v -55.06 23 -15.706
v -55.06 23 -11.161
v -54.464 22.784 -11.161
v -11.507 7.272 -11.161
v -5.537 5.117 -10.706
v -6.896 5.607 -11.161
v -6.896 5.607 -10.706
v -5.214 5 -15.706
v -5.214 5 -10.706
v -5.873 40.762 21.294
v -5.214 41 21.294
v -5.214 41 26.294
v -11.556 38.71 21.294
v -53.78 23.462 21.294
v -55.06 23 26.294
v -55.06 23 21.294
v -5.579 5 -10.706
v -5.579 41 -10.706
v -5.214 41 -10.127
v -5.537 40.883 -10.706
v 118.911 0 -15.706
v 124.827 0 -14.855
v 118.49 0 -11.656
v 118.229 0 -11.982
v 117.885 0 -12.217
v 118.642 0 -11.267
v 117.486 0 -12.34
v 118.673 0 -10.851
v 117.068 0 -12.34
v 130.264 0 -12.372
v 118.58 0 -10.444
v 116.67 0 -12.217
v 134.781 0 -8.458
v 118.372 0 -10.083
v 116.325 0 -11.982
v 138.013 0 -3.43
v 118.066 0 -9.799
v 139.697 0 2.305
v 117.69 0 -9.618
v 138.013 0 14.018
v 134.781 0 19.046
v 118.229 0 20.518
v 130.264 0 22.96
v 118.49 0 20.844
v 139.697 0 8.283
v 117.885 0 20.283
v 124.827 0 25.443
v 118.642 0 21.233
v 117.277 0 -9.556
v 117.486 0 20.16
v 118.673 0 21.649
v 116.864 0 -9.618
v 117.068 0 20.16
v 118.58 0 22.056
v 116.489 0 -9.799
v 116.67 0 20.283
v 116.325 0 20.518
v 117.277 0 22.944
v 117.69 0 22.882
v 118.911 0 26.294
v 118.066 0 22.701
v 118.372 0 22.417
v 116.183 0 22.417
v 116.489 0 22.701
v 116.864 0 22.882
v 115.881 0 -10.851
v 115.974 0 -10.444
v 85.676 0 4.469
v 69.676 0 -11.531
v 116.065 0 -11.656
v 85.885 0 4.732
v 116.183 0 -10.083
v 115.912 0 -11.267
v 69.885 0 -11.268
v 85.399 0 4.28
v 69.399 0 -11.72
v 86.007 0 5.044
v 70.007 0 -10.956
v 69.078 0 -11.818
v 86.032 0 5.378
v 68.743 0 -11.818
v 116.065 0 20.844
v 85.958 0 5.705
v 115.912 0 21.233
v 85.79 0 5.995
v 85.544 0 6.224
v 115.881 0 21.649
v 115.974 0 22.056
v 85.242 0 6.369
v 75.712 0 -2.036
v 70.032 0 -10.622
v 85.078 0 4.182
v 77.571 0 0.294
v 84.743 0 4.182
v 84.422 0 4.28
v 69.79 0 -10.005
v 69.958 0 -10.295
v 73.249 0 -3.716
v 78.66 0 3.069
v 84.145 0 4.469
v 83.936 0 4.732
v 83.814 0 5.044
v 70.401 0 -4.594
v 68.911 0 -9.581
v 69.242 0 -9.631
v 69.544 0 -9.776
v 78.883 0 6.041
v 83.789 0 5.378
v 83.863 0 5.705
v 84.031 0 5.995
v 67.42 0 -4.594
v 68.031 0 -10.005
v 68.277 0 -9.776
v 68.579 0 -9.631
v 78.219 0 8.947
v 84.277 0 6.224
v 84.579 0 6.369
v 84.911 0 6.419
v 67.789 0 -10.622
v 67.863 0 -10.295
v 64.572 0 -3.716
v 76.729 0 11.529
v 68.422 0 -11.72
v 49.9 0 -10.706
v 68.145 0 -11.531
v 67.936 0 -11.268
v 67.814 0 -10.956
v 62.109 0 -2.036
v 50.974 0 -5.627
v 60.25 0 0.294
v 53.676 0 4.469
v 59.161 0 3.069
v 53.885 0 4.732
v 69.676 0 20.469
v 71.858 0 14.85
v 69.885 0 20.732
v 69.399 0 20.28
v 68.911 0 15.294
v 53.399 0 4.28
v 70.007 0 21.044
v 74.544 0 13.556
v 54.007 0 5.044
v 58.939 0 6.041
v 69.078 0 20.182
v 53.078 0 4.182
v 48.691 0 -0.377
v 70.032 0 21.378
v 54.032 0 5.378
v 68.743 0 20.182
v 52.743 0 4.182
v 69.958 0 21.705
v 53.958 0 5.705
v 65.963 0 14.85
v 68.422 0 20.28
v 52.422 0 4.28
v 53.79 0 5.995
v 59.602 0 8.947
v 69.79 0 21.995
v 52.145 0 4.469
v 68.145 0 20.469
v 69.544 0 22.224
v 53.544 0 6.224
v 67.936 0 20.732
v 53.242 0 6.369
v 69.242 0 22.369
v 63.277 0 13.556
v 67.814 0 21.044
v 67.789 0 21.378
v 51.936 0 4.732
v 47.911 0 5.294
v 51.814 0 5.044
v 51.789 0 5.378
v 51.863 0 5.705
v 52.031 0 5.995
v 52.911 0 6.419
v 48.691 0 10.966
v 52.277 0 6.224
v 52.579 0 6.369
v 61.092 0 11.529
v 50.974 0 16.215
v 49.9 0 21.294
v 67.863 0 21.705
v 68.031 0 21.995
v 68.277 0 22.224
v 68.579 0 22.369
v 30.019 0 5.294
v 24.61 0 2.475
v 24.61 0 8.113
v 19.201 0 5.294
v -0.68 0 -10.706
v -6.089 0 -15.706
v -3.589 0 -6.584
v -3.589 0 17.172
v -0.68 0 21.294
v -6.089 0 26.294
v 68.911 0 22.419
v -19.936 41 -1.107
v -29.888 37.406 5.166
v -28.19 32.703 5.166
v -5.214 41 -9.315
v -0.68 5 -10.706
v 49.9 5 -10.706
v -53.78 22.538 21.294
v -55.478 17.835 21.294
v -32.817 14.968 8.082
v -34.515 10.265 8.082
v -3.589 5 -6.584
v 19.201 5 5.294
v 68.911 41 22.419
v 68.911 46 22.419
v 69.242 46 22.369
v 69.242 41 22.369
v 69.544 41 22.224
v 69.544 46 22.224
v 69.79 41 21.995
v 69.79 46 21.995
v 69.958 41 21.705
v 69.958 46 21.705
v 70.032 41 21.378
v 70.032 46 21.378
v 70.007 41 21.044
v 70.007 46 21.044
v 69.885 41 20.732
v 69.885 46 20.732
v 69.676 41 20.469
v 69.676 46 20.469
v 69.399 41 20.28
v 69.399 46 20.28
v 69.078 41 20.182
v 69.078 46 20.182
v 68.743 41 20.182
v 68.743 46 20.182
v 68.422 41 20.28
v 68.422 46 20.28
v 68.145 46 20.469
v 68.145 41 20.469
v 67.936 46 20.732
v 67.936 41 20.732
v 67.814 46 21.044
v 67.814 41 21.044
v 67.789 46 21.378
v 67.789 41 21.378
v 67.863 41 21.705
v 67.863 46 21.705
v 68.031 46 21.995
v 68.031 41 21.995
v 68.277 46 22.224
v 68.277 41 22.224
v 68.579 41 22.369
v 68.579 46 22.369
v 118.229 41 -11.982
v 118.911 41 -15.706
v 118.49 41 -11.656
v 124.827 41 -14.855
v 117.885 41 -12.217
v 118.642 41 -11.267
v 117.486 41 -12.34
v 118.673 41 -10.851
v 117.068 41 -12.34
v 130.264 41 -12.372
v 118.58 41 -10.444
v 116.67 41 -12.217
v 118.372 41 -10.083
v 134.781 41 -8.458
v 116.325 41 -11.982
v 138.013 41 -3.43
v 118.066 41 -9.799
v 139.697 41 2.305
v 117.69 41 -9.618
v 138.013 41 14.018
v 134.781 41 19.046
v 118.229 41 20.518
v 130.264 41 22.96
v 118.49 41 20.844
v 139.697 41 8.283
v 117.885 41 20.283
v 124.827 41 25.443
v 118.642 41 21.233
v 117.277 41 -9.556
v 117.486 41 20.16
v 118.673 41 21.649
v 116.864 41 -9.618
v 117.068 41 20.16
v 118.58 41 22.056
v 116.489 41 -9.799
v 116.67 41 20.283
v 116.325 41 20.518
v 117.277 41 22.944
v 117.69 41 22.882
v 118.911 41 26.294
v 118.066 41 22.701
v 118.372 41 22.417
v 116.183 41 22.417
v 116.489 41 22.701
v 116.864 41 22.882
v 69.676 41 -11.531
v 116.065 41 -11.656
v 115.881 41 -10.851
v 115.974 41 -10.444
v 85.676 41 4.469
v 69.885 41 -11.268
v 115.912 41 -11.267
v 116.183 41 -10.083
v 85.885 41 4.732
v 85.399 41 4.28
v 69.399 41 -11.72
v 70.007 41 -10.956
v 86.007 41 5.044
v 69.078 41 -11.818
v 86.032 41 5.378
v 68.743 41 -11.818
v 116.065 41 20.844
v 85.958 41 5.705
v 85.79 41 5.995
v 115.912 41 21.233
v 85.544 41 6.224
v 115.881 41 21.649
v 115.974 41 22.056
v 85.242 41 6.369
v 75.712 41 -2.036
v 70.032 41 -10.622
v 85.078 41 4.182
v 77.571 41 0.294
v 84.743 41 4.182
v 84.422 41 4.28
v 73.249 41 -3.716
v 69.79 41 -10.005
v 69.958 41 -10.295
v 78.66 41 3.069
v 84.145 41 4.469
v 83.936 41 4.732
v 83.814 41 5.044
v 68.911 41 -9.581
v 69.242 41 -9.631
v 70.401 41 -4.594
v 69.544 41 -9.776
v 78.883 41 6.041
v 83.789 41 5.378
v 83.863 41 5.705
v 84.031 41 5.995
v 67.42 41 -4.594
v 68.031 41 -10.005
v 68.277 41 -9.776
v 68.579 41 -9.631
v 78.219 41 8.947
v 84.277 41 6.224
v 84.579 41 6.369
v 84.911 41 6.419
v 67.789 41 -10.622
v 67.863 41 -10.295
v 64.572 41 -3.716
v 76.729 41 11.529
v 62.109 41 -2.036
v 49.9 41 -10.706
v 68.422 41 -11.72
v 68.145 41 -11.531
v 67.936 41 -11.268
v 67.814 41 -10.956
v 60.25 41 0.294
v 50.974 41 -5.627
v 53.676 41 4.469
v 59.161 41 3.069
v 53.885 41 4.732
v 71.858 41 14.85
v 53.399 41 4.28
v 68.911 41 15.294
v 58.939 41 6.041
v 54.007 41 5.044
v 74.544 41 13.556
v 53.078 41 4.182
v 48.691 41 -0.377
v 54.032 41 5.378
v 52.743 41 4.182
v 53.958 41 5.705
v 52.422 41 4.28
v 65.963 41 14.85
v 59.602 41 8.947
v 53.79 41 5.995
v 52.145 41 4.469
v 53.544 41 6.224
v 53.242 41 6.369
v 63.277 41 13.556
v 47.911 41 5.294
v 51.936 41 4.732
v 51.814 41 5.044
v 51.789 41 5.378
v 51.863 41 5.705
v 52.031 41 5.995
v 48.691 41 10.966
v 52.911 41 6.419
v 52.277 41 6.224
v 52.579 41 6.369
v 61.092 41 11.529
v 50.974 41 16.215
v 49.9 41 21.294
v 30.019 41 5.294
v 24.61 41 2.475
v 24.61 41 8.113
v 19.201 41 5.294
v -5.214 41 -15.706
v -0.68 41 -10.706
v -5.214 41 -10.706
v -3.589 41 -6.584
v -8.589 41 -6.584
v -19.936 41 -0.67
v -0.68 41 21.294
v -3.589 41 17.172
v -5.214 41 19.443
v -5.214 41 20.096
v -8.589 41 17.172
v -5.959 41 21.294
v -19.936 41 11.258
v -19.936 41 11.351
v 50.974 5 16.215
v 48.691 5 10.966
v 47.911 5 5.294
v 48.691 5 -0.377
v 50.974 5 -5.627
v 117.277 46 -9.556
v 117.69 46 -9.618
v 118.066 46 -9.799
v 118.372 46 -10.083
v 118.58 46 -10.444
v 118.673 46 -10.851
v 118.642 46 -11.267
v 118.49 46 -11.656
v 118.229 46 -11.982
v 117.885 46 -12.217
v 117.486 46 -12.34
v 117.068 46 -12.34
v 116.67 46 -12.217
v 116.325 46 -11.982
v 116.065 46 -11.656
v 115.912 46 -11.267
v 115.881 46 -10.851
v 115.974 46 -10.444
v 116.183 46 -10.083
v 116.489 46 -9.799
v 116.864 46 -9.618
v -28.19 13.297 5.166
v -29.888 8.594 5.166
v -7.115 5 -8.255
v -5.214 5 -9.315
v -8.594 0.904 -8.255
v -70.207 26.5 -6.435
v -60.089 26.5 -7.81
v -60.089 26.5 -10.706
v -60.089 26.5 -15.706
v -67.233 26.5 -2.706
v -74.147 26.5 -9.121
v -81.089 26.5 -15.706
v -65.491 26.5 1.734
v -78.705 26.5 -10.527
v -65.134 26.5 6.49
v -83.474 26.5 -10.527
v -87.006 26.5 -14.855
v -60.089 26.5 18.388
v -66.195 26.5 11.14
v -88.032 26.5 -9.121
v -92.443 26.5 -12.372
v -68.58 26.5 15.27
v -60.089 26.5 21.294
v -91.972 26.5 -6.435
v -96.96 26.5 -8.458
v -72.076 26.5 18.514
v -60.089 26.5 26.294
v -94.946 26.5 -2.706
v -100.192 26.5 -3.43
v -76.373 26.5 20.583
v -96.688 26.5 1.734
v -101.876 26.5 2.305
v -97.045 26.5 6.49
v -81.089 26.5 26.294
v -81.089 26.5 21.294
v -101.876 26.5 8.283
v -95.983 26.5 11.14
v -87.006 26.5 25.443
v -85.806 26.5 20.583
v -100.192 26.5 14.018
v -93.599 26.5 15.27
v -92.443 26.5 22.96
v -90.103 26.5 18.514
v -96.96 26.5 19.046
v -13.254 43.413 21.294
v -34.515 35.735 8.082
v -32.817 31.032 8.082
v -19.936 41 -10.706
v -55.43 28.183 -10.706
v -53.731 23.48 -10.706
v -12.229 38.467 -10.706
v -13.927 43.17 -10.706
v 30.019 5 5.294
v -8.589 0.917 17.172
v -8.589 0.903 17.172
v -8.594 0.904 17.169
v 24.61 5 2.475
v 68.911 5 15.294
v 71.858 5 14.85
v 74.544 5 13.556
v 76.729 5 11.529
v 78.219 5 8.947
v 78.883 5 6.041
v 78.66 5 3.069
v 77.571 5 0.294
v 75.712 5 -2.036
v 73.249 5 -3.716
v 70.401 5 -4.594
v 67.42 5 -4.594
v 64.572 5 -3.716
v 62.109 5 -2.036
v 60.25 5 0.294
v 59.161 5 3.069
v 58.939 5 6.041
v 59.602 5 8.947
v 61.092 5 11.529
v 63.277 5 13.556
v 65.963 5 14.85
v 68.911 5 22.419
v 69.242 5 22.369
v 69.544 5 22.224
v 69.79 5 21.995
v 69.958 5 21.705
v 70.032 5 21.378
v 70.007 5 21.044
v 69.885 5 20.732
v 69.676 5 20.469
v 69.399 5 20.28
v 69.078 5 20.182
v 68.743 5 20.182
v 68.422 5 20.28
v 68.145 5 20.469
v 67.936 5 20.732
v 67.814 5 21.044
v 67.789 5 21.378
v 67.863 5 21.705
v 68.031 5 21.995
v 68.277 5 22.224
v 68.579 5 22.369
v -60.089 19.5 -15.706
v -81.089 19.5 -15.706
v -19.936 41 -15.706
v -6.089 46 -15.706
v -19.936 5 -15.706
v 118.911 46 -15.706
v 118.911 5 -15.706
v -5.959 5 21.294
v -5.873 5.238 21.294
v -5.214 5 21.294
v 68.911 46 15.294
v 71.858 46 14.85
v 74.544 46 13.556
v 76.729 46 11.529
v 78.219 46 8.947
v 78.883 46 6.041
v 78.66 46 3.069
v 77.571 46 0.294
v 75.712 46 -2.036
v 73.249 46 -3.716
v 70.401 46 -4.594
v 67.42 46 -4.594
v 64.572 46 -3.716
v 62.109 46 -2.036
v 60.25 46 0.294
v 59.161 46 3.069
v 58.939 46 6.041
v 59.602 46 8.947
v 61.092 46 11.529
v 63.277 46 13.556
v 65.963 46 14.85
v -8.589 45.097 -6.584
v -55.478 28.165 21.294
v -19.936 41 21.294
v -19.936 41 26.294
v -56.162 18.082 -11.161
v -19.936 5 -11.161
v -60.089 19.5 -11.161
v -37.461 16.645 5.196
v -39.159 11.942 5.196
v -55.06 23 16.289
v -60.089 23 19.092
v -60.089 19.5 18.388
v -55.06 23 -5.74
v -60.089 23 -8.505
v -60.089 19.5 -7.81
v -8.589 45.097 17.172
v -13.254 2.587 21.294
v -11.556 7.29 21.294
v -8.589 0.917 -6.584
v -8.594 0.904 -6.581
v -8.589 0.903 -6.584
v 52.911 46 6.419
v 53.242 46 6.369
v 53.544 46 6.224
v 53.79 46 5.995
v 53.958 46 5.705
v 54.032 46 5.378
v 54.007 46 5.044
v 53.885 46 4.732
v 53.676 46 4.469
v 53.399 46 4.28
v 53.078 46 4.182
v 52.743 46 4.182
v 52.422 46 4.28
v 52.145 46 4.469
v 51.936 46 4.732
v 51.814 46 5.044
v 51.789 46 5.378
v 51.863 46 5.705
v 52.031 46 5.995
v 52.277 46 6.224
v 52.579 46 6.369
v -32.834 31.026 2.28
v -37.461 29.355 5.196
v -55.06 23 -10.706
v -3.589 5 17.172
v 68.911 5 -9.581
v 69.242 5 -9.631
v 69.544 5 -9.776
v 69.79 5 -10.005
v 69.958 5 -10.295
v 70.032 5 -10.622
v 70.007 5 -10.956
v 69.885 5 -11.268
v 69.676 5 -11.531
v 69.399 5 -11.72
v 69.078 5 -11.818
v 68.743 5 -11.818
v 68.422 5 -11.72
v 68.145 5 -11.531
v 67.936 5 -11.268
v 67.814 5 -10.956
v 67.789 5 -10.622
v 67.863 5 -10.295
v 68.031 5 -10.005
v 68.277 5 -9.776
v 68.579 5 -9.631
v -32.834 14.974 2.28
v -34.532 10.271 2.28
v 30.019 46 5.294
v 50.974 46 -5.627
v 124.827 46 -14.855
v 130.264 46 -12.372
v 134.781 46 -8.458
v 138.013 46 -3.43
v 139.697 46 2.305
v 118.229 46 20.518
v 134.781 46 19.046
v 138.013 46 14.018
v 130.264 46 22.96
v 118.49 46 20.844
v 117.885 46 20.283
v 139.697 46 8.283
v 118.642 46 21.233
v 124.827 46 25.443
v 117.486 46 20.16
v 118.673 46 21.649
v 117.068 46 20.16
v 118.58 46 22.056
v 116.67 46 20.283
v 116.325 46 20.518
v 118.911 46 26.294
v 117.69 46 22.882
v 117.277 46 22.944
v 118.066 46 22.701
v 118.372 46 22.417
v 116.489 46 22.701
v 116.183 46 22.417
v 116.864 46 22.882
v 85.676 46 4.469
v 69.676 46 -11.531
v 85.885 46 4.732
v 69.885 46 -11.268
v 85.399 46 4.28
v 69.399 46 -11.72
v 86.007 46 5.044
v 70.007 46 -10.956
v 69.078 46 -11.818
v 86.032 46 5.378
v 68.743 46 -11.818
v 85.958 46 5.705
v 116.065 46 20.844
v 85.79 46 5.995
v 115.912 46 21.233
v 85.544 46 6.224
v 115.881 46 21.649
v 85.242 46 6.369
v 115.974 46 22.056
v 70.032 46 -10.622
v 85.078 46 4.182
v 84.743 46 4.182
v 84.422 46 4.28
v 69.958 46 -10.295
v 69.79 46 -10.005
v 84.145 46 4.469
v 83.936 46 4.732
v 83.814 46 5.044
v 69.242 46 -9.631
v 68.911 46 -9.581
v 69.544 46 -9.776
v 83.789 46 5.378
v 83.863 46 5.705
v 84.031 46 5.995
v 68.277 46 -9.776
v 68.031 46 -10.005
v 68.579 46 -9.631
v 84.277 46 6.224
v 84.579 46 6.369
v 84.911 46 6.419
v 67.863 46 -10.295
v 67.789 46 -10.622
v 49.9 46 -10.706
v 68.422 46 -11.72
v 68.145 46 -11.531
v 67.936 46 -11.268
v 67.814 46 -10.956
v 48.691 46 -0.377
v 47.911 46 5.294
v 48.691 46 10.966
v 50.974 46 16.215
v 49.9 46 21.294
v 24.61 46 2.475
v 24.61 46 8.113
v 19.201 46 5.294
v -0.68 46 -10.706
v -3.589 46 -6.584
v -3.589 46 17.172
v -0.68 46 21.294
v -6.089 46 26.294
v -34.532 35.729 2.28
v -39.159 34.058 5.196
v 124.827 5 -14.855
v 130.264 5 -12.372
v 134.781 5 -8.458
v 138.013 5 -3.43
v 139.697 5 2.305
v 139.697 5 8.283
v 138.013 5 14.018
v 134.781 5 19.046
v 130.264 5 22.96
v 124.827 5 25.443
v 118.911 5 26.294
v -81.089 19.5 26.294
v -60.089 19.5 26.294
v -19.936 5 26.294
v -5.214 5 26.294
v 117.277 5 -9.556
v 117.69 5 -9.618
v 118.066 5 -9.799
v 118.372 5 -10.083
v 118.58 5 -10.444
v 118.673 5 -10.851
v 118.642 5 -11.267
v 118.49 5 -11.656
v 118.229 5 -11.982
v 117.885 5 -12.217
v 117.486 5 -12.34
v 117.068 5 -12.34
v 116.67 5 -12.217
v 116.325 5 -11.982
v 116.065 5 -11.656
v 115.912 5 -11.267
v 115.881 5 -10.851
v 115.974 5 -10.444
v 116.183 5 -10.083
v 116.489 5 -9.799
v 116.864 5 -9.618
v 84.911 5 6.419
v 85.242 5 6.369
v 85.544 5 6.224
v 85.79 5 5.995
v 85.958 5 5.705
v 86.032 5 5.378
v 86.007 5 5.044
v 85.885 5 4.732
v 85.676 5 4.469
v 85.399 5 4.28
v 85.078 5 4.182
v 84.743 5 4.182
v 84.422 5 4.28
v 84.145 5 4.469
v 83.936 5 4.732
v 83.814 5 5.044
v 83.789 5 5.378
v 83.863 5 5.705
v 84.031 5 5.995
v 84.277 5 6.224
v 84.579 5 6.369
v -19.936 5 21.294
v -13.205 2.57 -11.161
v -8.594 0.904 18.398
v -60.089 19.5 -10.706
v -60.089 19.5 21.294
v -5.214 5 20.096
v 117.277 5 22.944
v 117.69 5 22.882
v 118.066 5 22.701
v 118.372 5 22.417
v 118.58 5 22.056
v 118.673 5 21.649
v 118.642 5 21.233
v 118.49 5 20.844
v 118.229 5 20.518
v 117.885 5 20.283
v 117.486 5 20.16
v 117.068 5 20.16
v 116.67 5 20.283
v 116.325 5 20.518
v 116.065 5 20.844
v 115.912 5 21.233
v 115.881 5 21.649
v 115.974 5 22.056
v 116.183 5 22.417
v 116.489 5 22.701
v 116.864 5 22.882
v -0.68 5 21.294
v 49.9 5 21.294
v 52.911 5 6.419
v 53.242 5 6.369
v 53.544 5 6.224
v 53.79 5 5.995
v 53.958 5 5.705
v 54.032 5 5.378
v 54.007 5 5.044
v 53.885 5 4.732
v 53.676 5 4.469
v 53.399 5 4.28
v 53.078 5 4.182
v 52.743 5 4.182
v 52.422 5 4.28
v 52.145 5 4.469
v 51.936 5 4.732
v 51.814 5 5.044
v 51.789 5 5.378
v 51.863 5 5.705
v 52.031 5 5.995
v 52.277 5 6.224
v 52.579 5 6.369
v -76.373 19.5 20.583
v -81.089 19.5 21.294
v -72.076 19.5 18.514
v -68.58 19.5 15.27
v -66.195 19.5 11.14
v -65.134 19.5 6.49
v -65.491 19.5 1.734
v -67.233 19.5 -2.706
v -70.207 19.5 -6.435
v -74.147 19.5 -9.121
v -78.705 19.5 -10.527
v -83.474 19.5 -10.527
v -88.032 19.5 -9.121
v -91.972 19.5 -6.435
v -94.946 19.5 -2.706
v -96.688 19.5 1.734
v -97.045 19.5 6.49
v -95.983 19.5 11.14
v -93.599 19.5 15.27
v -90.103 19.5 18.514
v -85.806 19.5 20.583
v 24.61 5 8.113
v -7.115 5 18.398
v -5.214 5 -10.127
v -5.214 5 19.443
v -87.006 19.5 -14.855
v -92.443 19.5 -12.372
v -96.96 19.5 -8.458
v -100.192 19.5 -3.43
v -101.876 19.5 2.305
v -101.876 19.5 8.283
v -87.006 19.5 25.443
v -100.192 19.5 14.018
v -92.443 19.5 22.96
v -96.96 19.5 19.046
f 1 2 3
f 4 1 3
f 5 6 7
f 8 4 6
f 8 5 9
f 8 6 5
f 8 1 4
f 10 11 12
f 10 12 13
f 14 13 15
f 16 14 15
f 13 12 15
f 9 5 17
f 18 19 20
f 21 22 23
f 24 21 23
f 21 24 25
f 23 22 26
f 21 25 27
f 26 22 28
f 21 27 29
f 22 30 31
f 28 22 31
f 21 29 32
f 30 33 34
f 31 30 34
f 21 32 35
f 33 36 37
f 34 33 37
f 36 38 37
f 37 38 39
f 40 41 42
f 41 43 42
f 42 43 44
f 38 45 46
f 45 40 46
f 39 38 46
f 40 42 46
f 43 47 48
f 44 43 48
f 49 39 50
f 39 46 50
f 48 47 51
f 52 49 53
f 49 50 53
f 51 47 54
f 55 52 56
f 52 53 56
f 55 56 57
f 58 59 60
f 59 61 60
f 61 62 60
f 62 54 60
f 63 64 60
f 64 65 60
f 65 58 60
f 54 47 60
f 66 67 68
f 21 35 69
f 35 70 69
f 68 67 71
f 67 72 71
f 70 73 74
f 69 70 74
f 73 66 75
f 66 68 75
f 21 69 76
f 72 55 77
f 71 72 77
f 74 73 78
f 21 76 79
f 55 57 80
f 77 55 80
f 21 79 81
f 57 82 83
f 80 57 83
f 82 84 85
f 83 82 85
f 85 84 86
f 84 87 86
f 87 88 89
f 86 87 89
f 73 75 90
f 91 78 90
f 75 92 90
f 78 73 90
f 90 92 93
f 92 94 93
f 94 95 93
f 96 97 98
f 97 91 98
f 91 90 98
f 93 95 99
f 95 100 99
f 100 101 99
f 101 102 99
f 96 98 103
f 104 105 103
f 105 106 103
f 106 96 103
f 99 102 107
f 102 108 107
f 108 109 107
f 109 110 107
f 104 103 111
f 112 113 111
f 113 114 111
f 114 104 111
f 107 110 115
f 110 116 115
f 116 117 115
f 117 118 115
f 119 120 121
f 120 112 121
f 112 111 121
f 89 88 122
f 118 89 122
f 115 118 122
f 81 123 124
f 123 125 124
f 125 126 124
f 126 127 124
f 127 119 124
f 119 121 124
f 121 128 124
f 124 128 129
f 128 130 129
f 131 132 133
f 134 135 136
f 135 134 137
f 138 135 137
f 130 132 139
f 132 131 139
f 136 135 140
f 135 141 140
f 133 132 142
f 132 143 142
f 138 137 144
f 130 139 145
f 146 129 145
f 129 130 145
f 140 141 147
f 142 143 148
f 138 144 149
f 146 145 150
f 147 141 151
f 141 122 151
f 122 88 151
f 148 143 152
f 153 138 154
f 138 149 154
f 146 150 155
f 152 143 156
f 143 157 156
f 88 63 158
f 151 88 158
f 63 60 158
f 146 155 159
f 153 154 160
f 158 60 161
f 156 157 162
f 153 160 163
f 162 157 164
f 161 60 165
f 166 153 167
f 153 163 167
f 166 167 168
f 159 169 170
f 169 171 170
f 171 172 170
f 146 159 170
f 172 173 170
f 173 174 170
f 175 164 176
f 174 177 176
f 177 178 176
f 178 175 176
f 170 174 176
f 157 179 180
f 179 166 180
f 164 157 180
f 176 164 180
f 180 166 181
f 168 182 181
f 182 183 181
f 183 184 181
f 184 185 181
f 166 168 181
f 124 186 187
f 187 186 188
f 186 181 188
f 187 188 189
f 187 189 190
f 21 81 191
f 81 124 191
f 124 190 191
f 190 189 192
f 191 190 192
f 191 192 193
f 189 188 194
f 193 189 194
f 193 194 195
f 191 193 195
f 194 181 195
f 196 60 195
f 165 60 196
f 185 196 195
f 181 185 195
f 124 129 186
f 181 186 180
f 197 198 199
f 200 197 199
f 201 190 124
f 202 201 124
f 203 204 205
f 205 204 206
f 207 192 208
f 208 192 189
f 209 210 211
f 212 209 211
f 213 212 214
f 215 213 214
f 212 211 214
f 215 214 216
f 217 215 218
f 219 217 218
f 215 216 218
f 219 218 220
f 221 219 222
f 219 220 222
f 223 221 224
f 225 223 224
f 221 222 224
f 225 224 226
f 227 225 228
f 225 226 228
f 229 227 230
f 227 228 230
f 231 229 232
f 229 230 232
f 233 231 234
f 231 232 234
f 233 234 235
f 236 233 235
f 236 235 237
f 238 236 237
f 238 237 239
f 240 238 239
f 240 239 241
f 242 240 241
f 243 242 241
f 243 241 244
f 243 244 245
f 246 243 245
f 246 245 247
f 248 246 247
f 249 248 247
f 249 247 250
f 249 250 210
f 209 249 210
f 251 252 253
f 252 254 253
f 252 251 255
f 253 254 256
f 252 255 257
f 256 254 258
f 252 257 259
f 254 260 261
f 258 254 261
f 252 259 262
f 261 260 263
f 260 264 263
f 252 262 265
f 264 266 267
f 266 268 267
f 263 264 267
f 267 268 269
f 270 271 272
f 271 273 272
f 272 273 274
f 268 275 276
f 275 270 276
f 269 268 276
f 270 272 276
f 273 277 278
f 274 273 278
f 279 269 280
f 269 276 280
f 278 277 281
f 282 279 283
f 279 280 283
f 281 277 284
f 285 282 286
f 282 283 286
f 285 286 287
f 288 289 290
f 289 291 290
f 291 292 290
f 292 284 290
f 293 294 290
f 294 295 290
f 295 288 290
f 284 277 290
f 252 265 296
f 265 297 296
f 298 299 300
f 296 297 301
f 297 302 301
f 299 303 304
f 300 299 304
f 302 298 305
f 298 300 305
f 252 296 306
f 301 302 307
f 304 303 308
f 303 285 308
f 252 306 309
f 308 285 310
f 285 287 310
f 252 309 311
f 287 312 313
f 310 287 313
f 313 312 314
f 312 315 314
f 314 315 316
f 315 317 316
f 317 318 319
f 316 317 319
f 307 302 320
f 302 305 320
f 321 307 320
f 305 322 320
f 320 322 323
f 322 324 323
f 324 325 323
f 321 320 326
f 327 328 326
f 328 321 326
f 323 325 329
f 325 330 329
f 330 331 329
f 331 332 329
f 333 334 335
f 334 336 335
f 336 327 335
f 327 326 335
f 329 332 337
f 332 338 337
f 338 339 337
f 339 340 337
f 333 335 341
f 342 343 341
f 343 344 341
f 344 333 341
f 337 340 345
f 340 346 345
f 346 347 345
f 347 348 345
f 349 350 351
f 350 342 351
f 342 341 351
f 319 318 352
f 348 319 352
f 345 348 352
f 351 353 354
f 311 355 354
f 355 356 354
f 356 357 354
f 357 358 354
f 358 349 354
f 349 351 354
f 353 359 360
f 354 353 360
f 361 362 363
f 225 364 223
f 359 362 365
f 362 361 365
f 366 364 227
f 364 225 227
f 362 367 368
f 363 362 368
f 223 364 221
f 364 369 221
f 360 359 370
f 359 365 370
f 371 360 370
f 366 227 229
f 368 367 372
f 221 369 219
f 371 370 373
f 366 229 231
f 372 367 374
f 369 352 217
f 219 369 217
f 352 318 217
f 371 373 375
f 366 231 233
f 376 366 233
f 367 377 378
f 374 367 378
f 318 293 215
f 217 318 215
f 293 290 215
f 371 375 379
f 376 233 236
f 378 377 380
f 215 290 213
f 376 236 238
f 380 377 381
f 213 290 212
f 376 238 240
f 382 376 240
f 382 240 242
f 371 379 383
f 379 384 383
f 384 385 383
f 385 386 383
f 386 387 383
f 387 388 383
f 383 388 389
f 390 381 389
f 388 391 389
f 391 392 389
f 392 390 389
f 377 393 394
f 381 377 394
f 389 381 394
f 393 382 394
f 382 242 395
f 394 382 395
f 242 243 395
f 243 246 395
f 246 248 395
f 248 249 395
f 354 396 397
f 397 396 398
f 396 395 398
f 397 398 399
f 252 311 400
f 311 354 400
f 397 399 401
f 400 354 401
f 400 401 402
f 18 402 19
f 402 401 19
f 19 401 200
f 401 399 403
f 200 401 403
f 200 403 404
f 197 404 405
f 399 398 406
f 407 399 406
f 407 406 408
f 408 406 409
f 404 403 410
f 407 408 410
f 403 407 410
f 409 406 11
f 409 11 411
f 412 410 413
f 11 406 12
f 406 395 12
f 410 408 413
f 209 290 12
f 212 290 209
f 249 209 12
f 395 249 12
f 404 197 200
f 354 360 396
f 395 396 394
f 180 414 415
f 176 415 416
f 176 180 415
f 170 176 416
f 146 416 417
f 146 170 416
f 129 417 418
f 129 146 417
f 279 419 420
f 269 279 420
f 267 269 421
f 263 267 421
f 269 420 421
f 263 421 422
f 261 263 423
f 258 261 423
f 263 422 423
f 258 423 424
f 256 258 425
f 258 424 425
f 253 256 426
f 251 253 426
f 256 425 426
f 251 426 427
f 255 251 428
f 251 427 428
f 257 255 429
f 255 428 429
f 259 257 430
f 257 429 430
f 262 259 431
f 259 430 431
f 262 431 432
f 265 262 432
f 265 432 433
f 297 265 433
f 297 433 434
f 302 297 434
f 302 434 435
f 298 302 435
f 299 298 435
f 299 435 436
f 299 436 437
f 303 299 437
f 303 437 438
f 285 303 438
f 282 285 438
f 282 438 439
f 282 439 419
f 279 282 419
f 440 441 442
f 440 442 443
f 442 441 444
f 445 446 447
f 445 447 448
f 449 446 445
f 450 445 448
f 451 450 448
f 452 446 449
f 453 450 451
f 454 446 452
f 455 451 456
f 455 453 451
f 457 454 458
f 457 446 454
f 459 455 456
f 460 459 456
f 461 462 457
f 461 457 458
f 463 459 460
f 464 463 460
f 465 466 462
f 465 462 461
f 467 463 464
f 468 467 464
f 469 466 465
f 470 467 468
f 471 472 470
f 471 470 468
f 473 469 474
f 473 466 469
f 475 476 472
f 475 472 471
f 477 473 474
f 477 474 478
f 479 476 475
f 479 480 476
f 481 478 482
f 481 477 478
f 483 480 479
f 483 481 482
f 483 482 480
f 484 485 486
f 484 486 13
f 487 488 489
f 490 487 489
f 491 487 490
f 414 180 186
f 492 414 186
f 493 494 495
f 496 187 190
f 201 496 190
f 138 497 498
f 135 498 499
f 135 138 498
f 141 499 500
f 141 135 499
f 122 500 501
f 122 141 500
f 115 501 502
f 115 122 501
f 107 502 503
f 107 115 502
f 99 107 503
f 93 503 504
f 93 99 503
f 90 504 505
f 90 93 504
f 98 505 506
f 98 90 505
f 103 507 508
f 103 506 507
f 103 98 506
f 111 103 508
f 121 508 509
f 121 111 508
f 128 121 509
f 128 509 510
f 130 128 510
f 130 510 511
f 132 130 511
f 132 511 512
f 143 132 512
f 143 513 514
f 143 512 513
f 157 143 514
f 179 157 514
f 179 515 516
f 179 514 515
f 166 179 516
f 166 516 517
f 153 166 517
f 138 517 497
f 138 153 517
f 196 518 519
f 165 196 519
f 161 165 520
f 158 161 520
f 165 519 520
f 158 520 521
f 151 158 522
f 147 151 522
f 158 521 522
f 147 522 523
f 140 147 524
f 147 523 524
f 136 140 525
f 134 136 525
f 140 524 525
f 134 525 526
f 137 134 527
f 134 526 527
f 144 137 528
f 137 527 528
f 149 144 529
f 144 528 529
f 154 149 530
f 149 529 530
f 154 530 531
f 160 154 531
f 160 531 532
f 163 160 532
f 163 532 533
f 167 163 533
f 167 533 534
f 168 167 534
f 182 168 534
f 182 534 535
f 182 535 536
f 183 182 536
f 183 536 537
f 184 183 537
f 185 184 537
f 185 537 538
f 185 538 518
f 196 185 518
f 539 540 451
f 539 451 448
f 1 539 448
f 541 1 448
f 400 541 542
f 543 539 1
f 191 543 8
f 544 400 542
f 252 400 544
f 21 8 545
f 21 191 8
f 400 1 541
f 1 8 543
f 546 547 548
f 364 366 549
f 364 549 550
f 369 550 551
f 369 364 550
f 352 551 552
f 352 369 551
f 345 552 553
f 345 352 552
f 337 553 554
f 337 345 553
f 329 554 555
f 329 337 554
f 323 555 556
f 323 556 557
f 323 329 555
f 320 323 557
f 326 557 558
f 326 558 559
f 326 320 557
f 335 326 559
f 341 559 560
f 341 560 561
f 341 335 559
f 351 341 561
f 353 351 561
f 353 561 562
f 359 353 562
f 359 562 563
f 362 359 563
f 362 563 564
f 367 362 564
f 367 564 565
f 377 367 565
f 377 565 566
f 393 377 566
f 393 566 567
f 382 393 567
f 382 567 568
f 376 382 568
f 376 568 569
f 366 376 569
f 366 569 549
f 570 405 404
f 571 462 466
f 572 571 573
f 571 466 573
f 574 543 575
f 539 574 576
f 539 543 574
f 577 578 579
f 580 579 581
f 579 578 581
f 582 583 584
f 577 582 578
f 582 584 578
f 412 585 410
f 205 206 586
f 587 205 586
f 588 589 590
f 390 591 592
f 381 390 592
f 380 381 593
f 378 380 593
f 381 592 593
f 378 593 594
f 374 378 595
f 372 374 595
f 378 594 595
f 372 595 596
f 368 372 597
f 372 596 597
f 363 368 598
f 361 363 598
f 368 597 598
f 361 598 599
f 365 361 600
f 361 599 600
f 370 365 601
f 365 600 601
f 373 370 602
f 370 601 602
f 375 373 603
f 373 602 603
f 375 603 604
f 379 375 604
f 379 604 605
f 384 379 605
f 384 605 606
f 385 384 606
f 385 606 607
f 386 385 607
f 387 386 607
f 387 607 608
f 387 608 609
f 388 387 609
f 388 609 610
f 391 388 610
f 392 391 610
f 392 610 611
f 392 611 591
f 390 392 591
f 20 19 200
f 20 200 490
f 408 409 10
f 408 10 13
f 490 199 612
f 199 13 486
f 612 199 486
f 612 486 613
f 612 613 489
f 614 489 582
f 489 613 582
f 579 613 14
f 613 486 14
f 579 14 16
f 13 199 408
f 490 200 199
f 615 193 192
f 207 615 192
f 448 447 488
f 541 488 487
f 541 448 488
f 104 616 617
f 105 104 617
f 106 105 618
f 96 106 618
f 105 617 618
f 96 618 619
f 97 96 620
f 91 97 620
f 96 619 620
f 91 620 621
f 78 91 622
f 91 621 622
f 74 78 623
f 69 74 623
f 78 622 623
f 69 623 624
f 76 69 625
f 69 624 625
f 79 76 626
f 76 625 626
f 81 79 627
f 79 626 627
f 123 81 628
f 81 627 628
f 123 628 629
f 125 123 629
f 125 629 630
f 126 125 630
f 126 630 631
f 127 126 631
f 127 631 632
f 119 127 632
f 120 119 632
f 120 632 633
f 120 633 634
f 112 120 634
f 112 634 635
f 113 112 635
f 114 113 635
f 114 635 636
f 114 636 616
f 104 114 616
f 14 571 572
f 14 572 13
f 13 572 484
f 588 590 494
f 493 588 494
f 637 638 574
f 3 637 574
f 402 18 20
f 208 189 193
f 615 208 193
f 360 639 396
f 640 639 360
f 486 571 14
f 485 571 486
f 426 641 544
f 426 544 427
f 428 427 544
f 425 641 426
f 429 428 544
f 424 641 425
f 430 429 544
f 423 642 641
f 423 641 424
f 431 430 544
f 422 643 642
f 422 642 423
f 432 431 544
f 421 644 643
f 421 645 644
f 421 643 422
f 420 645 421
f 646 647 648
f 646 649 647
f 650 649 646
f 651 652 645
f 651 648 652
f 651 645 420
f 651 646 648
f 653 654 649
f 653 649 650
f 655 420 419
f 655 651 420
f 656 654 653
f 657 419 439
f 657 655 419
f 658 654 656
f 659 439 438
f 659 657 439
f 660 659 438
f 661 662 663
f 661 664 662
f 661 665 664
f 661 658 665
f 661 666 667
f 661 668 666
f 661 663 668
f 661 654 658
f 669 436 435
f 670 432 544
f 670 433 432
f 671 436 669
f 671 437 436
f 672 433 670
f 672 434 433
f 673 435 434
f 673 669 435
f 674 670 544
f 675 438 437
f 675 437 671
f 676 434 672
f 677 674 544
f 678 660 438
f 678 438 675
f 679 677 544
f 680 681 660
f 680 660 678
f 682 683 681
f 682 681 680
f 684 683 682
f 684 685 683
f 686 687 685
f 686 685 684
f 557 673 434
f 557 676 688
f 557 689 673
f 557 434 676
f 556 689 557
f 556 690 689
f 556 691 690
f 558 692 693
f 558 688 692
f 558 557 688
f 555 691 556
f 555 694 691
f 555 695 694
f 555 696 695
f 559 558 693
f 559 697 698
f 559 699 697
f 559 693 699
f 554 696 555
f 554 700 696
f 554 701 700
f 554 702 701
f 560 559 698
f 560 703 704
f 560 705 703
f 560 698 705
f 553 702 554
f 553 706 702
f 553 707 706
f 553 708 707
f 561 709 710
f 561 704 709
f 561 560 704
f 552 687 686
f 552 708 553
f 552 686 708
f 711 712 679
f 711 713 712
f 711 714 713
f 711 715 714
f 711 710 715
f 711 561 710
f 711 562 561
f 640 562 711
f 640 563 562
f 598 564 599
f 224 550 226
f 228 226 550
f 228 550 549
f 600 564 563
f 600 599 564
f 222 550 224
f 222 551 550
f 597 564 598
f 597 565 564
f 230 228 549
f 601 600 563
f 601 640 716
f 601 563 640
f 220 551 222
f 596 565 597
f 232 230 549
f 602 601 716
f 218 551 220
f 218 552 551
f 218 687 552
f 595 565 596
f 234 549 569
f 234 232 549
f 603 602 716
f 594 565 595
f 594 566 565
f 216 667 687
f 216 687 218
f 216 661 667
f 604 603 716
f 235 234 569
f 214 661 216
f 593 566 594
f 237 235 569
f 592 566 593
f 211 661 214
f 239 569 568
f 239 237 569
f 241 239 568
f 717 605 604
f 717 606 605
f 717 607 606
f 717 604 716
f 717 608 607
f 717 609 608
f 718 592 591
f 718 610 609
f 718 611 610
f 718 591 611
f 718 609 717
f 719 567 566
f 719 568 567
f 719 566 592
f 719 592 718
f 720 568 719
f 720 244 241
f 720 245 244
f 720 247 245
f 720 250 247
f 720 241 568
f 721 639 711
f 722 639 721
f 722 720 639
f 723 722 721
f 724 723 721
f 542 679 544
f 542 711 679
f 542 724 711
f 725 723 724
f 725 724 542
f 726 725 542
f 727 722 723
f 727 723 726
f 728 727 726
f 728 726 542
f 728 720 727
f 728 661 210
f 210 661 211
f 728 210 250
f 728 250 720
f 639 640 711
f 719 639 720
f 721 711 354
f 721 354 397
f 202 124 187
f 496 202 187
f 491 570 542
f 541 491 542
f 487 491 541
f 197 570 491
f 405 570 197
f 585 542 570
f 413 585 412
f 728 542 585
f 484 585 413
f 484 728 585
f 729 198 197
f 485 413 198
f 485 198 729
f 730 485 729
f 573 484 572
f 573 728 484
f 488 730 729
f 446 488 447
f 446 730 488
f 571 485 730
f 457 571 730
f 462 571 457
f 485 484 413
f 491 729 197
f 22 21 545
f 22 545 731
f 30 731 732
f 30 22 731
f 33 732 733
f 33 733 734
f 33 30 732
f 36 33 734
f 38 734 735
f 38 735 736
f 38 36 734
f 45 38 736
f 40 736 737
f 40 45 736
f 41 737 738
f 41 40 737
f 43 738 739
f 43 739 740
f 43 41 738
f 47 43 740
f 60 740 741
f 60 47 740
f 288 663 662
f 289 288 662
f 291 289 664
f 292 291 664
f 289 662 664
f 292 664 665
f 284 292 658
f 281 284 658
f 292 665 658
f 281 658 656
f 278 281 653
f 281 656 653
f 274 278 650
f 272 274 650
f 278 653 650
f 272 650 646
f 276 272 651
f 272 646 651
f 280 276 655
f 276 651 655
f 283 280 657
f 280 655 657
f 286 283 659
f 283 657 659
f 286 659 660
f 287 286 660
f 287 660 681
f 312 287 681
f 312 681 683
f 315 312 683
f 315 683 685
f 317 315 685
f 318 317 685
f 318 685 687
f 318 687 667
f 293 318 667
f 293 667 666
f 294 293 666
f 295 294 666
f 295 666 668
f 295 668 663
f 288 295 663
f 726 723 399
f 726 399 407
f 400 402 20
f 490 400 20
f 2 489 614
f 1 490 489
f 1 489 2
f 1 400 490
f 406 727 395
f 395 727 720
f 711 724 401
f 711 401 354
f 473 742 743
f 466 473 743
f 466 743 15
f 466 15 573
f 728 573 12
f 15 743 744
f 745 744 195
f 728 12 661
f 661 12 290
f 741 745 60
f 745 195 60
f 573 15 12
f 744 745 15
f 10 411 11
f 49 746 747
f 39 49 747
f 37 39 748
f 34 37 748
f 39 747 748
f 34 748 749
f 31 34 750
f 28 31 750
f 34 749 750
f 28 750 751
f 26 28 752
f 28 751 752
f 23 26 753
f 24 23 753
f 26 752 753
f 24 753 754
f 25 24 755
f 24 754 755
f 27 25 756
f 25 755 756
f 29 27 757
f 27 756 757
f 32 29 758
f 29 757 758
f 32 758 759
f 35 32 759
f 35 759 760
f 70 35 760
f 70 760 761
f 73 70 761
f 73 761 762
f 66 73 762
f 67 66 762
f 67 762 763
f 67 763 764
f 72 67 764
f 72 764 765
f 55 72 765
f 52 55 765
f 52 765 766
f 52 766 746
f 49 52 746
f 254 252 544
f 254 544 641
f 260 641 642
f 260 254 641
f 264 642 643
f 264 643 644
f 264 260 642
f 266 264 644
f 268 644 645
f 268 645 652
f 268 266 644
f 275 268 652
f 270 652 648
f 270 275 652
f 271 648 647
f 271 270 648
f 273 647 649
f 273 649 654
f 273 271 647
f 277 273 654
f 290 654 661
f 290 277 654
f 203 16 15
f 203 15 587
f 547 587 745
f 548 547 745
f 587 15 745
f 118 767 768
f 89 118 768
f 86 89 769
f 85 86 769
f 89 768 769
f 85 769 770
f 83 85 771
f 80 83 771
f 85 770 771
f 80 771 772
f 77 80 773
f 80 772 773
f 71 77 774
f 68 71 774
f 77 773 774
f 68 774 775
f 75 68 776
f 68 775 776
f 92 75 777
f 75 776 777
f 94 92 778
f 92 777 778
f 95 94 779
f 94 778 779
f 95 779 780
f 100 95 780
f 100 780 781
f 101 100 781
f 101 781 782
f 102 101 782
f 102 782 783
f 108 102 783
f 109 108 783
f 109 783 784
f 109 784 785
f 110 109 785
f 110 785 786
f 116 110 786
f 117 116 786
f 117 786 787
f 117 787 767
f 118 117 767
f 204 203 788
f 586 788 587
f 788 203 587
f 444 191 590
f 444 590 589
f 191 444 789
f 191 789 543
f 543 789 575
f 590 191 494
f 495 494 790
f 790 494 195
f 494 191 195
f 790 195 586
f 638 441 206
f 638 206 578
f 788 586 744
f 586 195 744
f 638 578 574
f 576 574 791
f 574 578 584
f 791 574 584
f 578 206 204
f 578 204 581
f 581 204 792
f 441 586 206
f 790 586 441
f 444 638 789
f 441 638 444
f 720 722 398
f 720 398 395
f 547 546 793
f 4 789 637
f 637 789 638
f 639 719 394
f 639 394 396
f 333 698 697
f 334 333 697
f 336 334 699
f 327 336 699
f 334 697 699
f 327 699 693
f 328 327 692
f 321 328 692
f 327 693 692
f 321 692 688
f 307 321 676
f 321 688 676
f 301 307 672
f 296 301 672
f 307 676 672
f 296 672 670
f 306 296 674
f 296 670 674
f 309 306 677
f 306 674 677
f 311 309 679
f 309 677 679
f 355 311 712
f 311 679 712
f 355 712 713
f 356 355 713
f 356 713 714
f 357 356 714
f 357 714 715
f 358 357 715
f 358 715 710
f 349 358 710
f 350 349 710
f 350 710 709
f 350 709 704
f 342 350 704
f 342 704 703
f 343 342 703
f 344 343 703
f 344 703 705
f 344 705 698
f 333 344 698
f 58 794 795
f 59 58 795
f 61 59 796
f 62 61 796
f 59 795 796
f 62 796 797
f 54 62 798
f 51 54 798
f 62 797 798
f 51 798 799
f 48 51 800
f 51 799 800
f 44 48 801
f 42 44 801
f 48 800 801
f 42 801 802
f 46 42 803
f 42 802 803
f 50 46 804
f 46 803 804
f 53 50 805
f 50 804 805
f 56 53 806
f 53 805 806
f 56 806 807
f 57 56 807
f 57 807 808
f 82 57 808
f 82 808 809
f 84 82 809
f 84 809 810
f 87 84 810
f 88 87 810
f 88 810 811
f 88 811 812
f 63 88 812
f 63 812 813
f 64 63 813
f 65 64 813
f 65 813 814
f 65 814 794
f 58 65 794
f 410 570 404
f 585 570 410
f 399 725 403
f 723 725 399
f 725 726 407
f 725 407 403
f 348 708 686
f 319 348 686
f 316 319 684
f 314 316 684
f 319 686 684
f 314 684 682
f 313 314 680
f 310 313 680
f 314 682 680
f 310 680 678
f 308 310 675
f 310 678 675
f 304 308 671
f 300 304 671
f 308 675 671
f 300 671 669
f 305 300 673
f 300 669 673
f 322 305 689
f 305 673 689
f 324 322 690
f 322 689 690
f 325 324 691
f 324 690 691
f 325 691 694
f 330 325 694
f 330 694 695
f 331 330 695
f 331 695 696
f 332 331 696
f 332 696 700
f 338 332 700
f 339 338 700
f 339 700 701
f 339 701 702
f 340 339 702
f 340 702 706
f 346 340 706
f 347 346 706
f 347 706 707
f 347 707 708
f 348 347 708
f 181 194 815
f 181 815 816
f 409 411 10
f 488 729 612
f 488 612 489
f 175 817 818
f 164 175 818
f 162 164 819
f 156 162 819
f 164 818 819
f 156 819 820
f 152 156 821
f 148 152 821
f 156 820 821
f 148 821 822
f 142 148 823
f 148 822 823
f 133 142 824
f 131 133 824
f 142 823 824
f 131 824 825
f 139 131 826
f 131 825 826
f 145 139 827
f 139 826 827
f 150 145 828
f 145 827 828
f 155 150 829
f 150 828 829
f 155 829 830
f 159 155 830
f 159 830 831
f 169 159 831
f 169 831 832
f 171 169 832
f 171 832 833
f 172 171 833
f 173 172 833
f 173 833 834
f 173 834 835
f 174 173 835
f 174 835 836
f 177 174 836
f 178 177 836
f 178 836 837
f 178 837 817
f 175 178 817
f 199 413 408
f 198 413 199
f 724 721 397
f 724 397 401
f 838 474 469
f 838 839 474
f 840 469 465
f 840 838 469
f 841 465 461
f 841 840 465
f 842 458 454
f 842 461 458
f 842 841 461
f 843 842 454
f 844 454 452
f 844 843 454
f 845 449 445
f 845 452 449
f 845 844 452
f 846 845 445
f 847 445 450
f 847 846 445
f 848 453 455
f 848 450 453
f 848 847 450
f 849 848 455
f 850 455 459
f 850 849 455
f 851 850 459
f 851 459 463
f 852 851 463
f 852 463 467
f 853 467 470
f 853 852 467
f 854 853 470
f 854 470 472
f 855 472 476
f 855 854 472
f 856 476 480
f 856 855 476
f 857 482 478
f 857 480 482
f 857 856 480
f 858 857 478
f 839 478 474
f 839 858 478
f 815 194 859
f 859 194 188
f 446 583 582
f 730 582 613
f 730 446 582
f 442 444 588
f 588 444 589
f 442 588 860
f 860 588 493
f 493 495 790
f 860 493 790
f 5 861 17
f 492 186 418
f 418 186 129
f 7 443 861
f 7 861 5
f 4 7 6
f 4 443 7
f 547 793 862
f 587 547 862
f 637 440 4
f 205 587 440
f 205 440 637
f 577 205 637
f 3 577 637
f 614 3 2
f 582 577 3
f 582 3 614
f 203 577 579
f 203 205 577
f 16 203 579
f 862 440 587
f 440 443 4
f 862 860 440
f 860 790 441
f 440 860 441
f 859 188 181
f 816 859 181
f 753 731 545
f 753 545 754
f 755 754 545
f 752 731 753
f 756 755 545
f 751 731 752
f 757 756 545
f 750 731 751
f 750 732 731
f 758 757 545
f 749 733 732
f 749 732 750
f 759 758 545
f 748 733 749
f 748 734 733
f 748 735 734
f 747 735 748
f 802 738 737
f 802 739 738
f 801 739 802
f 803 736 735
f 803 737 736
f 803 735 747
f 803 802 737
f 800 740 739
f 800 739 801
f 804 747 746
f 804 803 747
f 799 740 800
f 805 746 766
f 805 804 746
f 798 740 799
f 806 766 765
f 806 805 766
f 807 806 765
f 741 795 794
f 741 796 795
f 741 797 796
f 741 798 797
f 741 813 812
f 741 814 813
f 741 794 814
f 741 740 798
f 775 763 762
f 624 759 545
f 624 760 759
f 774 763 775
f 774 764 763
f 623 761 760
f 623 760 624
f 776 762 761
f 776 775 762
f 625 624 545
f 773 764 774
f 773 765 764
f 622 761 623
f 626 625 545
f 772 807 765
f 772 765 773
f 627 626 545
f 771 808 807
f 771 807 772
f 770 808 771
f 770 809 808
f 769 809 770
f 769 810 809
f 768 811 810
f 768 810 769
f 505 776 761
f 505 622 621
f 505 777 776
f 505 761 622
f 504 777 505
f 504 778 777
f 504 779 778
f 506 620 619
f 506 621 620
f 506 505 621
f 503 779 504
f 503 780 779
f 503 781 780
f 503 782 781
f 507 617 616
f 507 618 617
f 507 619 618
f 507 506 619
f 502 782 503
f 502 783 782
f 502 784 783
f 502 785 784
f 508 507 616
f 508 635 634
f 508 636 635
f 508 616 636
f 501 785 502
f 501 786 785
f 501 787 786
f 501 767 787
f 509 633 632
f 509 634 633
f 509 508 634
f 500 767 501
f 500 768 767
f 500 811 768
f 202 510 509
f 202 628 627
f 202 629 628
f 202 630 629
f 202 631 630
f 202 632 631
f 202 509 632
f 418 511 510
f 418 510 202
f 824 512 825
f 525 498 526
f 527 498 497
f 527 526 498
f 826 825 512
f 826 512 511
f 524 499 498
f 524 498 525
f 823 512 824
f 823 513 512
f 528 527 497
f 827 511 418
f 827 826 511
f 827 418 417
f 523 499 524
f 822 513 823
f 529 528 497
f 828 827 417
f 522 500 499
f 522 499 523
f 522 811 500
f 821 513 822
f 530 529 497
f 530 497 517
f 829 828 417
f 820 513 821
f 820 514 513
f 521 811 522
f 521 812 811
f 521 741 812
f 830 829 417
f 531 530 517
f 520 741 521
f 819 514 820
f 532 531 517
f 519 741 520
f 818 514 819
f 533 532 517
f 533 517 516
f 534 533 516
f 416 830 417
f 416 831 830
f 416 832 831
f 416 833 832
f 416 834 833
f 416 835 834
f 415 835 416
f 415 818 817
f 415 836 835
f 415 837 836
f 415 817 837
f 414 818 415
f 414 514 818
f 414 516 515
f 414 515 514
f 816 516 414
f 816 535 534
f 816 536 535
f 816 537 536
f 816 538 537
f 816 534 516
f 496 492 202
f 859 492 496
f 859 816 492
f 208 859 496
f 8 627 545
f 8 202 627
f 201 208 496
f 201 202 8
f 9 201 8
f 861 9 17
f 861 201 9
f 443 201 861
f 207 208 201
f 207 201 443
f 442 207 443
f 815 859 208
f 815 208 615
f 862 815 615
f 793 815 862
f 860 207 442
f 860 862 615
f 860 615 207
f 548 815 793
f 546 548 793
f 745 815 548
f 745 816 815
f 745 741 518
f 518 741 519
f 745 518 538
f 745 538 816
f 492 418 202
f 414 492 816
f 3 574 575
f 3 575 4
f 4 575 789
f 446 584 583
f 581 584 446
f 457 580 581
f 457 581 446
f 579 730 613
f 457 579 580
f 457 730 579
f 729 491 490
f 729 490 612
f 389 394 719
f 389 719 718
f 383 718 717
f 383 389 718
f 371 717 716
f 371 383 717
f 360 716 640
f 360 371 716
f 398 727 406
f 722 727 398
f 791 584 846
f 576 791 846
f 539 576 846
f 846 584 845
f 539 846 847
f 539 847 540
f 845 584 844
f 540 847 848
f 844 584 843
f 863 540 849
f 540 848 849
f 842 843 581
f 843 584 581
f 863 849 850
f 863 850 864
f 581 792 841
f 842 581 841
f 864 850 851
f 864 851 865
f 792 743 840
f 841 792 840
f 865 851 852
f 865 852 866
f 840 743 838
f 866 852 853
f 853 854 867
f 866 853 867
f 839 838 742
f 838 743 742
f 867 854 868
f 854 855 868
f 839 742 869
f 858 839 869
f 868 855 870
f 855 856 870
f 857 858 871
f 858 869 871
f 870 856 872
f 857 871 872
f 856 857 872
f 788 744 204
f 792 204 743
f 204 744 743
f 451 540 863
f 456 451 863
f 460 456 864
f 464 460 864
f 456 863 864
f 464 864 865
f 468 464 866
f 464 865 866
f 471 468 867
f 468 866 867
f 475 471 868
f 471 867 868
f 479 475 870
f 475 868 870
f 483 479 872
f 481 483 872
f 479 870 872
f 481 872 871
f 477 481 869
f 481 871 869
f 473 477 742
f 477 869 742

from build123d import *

# Parameters (mm, degrees)
SKETCH_1_R               = 21
SKETCH_1_R_2             = 16
EXTRUDE_1_DEPTH          = 46
SKETCH_1_R_3             = 10
EXTRUDE_1_2_DEPTH        = 46
SKETCH_2_W               = 150
SKETCH_2_H               = 5
EXTRUDE_3_DEPTH          = 5
SKETCH_3_W               = 150
SKETCH_3_H               = 5
EXTRUDE_4_DEPTH          = 5
EXTRUDE_5_DEPTH          = 5
SKETCH_6_W               = 169.409921662
SKETCH_6_H               = 36
CUT_EXTRUDE_1_DEPTH      = 42
CUT_EXTRUDE_4_REACH      = 155.15
EXTRUDE_7_DEPTH          = 5
EXTRUDE_8_REACH          = 155.15
EXTRUDE_8_END_RADIUS     = 21
SKETCH_10_W              = 21
SKETCH_10_H              = 7
SKETCH_11_W              = 54.75
SKETCH_11_H              = 32.4550301
CUT_EXTRUDE_5_DEPTH      = 5
EXTRUDE_15_DEPTH         = 5
SKETCH_13_R              = 1.125
CUT_EXTRUDE_6_DEPTH      = 150.607304507
CUT_EXTRUDE_6_DEPTH_BACK = 150.607304507
SKETCH_14_R              = 1.4
CUT_EXTRUDE_7_DEPTH      = 150.607304507
CUT_EXTRUDE_7_DEPTH_BACK = 150.607304507


with BuildPart() as part:
    # 스케치1 → 보스-돌출1 (new body)
    with BuildSketch(Plane(origin=(0, 0, 0), x_dir=(1, 0, 0), z_dir=(0, 1, 0))):
        with Locations(Location((-81.089427727, -5.294054995, 0), (0, 0, 270))):
            Circle(SKETCH_1_R)
        with Locations(Location((-81.089427727, -5.294054995, 0), (0, 0, 270))):
            Circle(SKETCH_1_R_2, mode=Mode.SUBTRACT)
    extrude(amount=EXTRUDE_1_DEPTH)



with BuildPart() as body_2:
    # 스케치1 → Extrude 1 2 (new body)
    with BuildSketch(Plane(origin=(0, 0, 0), x_dir=(1, 0, 0), z_dir=(0, 1, 0))):
        with BuildLine():
            Line((68.910572273, 15.705945005), (118.910572273, 15.705945005))
            ThreePointArc((118.910572273, 15.705945005), (139.910572273, -5.294054995), (118.910572273, -26.294054995))
            Line((118.910572273, -26.294054995), (68.910572273, -26.294054995))
            ThreePointArc((68.910572273, -26.294054995), (47.910572273, -5.294054995), (68.910572273, 15.705945005))
        make_face()
        with Locations(Location((68.910572273, -5.294054995, 0), (0, 0, 270))):
            Circle(SKETCH_1_R_3, mode=Mode.SUBTRACT)
    extrude(amount=EXTRUDE_1_2_DEPTH)


with BuildPart() as part_1:
    add(part.part)

    add(body_2.part)  # 보스-돌출3 merges body 2
    # 스케치2 → 보스-돌출3 (add)
    with BuildSketch(Plane(origin=(0, 46, 0), x_dir=(1, 0, 0), z_dir=(0, 1, 0))):
        with Locations((-6.089427727, -23.794054995)):
            Rectangle(SKETCH_2_W, SKETCH_2_H)
        with Locations((-6.089427727, 13.205945005)):
            Rectangle(SKETCH_2_W, SKETCH_2_H)
    extrude(amount=-EXTRUDE_3_DEPTH)

    # 스케치3 → 보스-돌출4 (add)
    with BuildSketch(Plane.XZ):
        with Locations((-6.089427727, -13.205945005)):
            Rectangle(SKETCH_3_W, SKETCH_3_H)
        with Locations((-6.089427727, 23.794054995)):
            Rectangle(SKETCH_3_W, SKETCH_3_H)
    extrude(amount=-EXTRUDE_4_DEPTH)

    # 스케치4 → 보스-돌출5 (add)
    with BuildSketch(Plane.XZ):
        Polygon((-36.788692473, 8.113223678), (-7.244877213, 23.511020598), (-6.089427727, 21.294054995), (-4.933978242, 23.511020598), (24.609837018, 8.113223678), (54.153652279, 23.511020598), (56.46455125, 19.077089392), (30.018987378, 5.294054995), (56.46455125, -8.488979402), (54.153652279, -12.922910608), (24.609837018, 2.474886312), (-4.933978242, -12.922910608), (-7.244877213, -12.922910608), (-36.788692473, 2.474886312), (-66.332507733, -12.922910608), (-68.643406704, -8.488979402), (-42.197842833, 5.294054995), (-68.643406704, 19.077089392), (-66.332507733, 23.511020598), align=None)
        Polygon((-31.379542113, 5.294054995), (-8.589427727, -6.583813521), (-8.589427727, 17.17192351), align=None, mode=Mode.SUBTRACT)
        Polygon((-3.589427727, -6.583813521), (19.200686659, 5.294054995), (-3.589427727, 17.17192351), align=None, mode=Mode.SUBTRACT)
    extrude_5 = extrude(amount=-EXTRUDE_5_DEPTH)

    # 스케치6 → 컷-돌출1 (cut)
    with BuildSketch(Plane(origin=(0, 0, -15.705945005), x_dir=(-1, 0, 0), z_dir=(0, 0, -1))):
        with Locations((-75.35345041, 23)):
            Rectangle(SKETCH_6_W, SKETCH_6_H)
    extrude(amount=-CUT_EXTRUDE_1_DEPTH, mode=Mode.SUBTRACT)

    # 대칭 복사1: 보스-돌출5 across plane
    add(extrude_5.mirror(Plane.ZX.offset(23)))

    # 컷-돌출4: up to this face of the body (flat: up to its plane)
    cut_extrude_4_end = Plane(part_1.part.faces().sort_by_distance((18.910572273, 43.5, 26.294054995))[0])
    # 스케치7 → 컷-돌출4 (cut, up to the picked face)
    with BuildSketch(Plane(origin=(0, 0, -15.705945005), x_dir=(-1, 0, 0), z_dir=(0, 0, -1)), mode=Mode.PRIVATE) as cut_extrude_4_sk1:
        Polygon((6.089427727, 0), (60.089427727, 19.5), (108.089427727, 19.5), (108.089427727, 26.5), (60.089427727, 26.5), (6.089427727, 46), (127.814090618, 46), (127.814090618, 0), align=None)
    cut_extrude_4_tool1 = split(extrude(cut_extrude_4_sk1.sketch, amount=-CUT_EXTRUDE_4_REACH, mode=Mode.PRIVATE), bisect_by=cut_extrude_4_end, keep=Keep.BOTH, mode=Mode.PRIVATE)
    add(cut_extrude_4_tool1.solids().sort_by(Axis((-33.531395, 8.526091, -15.705945), (0, 0, 1)))[0], mode=Mode.SUBTRACT)


with BuildPart() as cut_extrude_4_piece_1:
    # of the separate pieces the step leaves, piece 1, a body of its own (cut_extrude_4_pieces)
    add(part_1.part.solids().sort_by_distance((-6.089427727, 0, -15.705945005))[0])



with BuildPart() as cut_extrude_4_piece_2:
    # of the separate pieces the step leaves, piece 2, a body of its own (cut_extrude_4_pieces)
    add(part_1.part.solids().sort_by_distance((118.910572273, 41, 26.294054995))[0])


with BuildPart() as cut_extrude_4_piece_3:
    # of the separate pieces the step leaves, piece 3, a body of its own (cut_extrude_4_pieces)
    add(part_1.part.solids().sort_by_distance((-81.089427727, 19.5, 26.294054995))[0])


with BuildPart() as cut_extrude_4_piece_1_1:
    add(cut_extrude_4_piece_1.part)

    add(cut_extrude_4_piece_2.part)  # 보스-돌출7 merges 컷-돌출4 piece 2

    add(cut_extrude_4_piece_3.part)  # 보스-돌출7 merges 컷-돌출4 piece 3
    # 스케치9 → 보스-돌출7 (add)
    with BuildSketch(Plane(origin=(0, 0, -15.705945005), x_dir=(-1, 0, 0), z_dir=(0, 0, -1))):
        Polygon((4.391205408, 41.297230502), (55.060459105, 23), (4.391205408, 4.702769498), (6.089427727, 0), (69.781735419, 23), (6.089427727, 46), align=None)
    extrude_7 = extrude(amount=-EXTRUDE_7_DEPTH)

    # 보스-돌출8: up to this cylinder (the profile starts outside it)
    extrude_8_end = Plane(origin=(-81.089427727, 23, 5.294054995), z_dir=(0, -1, 0)) * Cylinder(EXTRUDE_8_END_RADIUS, 353.3, mode=Mode.PRIVATE)
    # 스케치10 → 보스-돌출8 (add, up to the surface)
    with BuildSketch(Plane(origin=(0, 0, -15.705945005), x_dir=(-1, 0, 0), z_dir=(0, 0, -1)), mode=Mode.PRIVATE) as extrude_8_sk1:
        with Locations((70.589427727, 23)):
            Rectangle(SKETCH_10_W, SKETCH_10_H)
    extrude_8_tool1 = extrude(extrude_8_sk1.sketch, amount=-EXTRUDE_8_REACH, mode=Mode.PRIVATE) - extrude_8_end
    extrude_8 = extrude_8_tool1.solids().sort_by_distance((-70.589428, 23, -15.705945))[0]
    add(extrude_8)

    # 대칭 복사2: 보스-돌출7, 보스-돌출8 across plane
    add(extrude_7.mirror(Plane(origin=(0, 0, 5.294054995), x_dir=(1, 0, 0), z_dir=(0, 0, -1))))
    add(extrude_8.mirror(Plane(origin=(0, 0, 5.294054995), x_dir=(1, 0, 0), z_dir=(0, 0, -1))))

    # 스케치11 → 컷-돌출5 (cut)
    with BuildSketch(Plane(origin=(-0.702466407, -1.945291588, 0), x_dir=(0.9405538996916954, -0.3396444637775568, 0), z_dir=(-0.3396444637775568, -0.9405538996916956, 0))):
        with Locations((-35.765412623, 5.066539945)):
            Rectangle(SKETCH_11_W, SKETCH_11_H)
    extrude(amount=-CUT_EXTRUDE_5_DEPTH, mode=Mode.SUBTRACT)

    # 스케치12 → 보스-돌출15 (add)
    with BuildSketch(Plane(origin=(-0.702466407, -1.945291588, 0), x_dir=(0.9405538996916956, -0.33964446377755675, 0), z_dir=(-0.33964446377755675, -0.9405538996916956, 0))):
        Polygon((-31.030335125, 5.165890673), (-6.246195793, -9.525798606), (-8.795823184, -13.826891509), (-35.96762349, 2.280169619), (-64.18375705, -14.211451822), (-66.706787961, -9.894703622), (-40.887006083, 5.196310444), (-66.473080759, 20.363375718), (-63.923453368, 24.664468621), (-35.949717718, 8.082031497), (-8.84109266, 23.926342034), (-6.318061748, 19.609593834), align=None)
    extrude_15 = extrude(amount=-EXTRUDE_15_DEPTH)

    # 대칭 복사3: 보스-돌출15 across plane
    add(extrude_15.mirror(Plane.ZX.offset(23)))

    # 스케치13 → 컷-돌출6 (cut, two sides)
    with BuildSketch(Plane(origin=(0, 46, 0), x_dir=(1, 0, 0), z_dir=(0, 1, 0))) as cut_extrude_6_sk:
        with Locations(Location((84.910572273, -5.294054995, 0), (0, 0, 270))):
            Circle(SKETCH_13_R)
        with Locations(Location((52.910572273, -5.294054995, 0), (0, 0, 270))):
            Circle(SKETCH_13_R)
        with Locations(Location((68.910572273, -21.294054995, 0), (0, 0, 270))):
            Circle(SKETCH_13_R)
        with Locations(Location((68.910572273, 10.705945005, 0), (0, 0, 270))):
            Circle(SKETCH_13_R)
    extrude(amount=CUT_EXTRUDE_6_DEPTH, mode=Mode.SUBTRACT)
    extrude(cut_extrude_6_sk.sketch, amount=-CUT_EXTRUDE_6_DEPTH_BACK, mode=Mode.SUBTRACT)

    # 스케치14 → 컷-돌출7 (cut, two sides)
    with BuildSketch(Plane(origin=(0, 46, 0), x_dir=(1, 0, 0), z_dir=(0, 1, 0))) as cut_extrude_7_sk:
        with Locations(Location((117.277150097, 10.955945005, 0), (0, 0, 270))):
            Circle(SKETCH_14_R)
        with Locations(Location((117.277150097, -21.544054995, 0), (0, 0, 270))):
            Circle(SKETCH_14_R)
    extrude(amount=CUT_EXTRUDE_7_DEPTH, mode=Mode.SUBTRACT)
    extrude(cut_extrude_7_sk.sketch, amount=-CUT_EXTRUDE_7_DEPTH_BACK, mode=Mode.SUBTRACT)


solid = cut_extrude_4_piece_1_1.part
